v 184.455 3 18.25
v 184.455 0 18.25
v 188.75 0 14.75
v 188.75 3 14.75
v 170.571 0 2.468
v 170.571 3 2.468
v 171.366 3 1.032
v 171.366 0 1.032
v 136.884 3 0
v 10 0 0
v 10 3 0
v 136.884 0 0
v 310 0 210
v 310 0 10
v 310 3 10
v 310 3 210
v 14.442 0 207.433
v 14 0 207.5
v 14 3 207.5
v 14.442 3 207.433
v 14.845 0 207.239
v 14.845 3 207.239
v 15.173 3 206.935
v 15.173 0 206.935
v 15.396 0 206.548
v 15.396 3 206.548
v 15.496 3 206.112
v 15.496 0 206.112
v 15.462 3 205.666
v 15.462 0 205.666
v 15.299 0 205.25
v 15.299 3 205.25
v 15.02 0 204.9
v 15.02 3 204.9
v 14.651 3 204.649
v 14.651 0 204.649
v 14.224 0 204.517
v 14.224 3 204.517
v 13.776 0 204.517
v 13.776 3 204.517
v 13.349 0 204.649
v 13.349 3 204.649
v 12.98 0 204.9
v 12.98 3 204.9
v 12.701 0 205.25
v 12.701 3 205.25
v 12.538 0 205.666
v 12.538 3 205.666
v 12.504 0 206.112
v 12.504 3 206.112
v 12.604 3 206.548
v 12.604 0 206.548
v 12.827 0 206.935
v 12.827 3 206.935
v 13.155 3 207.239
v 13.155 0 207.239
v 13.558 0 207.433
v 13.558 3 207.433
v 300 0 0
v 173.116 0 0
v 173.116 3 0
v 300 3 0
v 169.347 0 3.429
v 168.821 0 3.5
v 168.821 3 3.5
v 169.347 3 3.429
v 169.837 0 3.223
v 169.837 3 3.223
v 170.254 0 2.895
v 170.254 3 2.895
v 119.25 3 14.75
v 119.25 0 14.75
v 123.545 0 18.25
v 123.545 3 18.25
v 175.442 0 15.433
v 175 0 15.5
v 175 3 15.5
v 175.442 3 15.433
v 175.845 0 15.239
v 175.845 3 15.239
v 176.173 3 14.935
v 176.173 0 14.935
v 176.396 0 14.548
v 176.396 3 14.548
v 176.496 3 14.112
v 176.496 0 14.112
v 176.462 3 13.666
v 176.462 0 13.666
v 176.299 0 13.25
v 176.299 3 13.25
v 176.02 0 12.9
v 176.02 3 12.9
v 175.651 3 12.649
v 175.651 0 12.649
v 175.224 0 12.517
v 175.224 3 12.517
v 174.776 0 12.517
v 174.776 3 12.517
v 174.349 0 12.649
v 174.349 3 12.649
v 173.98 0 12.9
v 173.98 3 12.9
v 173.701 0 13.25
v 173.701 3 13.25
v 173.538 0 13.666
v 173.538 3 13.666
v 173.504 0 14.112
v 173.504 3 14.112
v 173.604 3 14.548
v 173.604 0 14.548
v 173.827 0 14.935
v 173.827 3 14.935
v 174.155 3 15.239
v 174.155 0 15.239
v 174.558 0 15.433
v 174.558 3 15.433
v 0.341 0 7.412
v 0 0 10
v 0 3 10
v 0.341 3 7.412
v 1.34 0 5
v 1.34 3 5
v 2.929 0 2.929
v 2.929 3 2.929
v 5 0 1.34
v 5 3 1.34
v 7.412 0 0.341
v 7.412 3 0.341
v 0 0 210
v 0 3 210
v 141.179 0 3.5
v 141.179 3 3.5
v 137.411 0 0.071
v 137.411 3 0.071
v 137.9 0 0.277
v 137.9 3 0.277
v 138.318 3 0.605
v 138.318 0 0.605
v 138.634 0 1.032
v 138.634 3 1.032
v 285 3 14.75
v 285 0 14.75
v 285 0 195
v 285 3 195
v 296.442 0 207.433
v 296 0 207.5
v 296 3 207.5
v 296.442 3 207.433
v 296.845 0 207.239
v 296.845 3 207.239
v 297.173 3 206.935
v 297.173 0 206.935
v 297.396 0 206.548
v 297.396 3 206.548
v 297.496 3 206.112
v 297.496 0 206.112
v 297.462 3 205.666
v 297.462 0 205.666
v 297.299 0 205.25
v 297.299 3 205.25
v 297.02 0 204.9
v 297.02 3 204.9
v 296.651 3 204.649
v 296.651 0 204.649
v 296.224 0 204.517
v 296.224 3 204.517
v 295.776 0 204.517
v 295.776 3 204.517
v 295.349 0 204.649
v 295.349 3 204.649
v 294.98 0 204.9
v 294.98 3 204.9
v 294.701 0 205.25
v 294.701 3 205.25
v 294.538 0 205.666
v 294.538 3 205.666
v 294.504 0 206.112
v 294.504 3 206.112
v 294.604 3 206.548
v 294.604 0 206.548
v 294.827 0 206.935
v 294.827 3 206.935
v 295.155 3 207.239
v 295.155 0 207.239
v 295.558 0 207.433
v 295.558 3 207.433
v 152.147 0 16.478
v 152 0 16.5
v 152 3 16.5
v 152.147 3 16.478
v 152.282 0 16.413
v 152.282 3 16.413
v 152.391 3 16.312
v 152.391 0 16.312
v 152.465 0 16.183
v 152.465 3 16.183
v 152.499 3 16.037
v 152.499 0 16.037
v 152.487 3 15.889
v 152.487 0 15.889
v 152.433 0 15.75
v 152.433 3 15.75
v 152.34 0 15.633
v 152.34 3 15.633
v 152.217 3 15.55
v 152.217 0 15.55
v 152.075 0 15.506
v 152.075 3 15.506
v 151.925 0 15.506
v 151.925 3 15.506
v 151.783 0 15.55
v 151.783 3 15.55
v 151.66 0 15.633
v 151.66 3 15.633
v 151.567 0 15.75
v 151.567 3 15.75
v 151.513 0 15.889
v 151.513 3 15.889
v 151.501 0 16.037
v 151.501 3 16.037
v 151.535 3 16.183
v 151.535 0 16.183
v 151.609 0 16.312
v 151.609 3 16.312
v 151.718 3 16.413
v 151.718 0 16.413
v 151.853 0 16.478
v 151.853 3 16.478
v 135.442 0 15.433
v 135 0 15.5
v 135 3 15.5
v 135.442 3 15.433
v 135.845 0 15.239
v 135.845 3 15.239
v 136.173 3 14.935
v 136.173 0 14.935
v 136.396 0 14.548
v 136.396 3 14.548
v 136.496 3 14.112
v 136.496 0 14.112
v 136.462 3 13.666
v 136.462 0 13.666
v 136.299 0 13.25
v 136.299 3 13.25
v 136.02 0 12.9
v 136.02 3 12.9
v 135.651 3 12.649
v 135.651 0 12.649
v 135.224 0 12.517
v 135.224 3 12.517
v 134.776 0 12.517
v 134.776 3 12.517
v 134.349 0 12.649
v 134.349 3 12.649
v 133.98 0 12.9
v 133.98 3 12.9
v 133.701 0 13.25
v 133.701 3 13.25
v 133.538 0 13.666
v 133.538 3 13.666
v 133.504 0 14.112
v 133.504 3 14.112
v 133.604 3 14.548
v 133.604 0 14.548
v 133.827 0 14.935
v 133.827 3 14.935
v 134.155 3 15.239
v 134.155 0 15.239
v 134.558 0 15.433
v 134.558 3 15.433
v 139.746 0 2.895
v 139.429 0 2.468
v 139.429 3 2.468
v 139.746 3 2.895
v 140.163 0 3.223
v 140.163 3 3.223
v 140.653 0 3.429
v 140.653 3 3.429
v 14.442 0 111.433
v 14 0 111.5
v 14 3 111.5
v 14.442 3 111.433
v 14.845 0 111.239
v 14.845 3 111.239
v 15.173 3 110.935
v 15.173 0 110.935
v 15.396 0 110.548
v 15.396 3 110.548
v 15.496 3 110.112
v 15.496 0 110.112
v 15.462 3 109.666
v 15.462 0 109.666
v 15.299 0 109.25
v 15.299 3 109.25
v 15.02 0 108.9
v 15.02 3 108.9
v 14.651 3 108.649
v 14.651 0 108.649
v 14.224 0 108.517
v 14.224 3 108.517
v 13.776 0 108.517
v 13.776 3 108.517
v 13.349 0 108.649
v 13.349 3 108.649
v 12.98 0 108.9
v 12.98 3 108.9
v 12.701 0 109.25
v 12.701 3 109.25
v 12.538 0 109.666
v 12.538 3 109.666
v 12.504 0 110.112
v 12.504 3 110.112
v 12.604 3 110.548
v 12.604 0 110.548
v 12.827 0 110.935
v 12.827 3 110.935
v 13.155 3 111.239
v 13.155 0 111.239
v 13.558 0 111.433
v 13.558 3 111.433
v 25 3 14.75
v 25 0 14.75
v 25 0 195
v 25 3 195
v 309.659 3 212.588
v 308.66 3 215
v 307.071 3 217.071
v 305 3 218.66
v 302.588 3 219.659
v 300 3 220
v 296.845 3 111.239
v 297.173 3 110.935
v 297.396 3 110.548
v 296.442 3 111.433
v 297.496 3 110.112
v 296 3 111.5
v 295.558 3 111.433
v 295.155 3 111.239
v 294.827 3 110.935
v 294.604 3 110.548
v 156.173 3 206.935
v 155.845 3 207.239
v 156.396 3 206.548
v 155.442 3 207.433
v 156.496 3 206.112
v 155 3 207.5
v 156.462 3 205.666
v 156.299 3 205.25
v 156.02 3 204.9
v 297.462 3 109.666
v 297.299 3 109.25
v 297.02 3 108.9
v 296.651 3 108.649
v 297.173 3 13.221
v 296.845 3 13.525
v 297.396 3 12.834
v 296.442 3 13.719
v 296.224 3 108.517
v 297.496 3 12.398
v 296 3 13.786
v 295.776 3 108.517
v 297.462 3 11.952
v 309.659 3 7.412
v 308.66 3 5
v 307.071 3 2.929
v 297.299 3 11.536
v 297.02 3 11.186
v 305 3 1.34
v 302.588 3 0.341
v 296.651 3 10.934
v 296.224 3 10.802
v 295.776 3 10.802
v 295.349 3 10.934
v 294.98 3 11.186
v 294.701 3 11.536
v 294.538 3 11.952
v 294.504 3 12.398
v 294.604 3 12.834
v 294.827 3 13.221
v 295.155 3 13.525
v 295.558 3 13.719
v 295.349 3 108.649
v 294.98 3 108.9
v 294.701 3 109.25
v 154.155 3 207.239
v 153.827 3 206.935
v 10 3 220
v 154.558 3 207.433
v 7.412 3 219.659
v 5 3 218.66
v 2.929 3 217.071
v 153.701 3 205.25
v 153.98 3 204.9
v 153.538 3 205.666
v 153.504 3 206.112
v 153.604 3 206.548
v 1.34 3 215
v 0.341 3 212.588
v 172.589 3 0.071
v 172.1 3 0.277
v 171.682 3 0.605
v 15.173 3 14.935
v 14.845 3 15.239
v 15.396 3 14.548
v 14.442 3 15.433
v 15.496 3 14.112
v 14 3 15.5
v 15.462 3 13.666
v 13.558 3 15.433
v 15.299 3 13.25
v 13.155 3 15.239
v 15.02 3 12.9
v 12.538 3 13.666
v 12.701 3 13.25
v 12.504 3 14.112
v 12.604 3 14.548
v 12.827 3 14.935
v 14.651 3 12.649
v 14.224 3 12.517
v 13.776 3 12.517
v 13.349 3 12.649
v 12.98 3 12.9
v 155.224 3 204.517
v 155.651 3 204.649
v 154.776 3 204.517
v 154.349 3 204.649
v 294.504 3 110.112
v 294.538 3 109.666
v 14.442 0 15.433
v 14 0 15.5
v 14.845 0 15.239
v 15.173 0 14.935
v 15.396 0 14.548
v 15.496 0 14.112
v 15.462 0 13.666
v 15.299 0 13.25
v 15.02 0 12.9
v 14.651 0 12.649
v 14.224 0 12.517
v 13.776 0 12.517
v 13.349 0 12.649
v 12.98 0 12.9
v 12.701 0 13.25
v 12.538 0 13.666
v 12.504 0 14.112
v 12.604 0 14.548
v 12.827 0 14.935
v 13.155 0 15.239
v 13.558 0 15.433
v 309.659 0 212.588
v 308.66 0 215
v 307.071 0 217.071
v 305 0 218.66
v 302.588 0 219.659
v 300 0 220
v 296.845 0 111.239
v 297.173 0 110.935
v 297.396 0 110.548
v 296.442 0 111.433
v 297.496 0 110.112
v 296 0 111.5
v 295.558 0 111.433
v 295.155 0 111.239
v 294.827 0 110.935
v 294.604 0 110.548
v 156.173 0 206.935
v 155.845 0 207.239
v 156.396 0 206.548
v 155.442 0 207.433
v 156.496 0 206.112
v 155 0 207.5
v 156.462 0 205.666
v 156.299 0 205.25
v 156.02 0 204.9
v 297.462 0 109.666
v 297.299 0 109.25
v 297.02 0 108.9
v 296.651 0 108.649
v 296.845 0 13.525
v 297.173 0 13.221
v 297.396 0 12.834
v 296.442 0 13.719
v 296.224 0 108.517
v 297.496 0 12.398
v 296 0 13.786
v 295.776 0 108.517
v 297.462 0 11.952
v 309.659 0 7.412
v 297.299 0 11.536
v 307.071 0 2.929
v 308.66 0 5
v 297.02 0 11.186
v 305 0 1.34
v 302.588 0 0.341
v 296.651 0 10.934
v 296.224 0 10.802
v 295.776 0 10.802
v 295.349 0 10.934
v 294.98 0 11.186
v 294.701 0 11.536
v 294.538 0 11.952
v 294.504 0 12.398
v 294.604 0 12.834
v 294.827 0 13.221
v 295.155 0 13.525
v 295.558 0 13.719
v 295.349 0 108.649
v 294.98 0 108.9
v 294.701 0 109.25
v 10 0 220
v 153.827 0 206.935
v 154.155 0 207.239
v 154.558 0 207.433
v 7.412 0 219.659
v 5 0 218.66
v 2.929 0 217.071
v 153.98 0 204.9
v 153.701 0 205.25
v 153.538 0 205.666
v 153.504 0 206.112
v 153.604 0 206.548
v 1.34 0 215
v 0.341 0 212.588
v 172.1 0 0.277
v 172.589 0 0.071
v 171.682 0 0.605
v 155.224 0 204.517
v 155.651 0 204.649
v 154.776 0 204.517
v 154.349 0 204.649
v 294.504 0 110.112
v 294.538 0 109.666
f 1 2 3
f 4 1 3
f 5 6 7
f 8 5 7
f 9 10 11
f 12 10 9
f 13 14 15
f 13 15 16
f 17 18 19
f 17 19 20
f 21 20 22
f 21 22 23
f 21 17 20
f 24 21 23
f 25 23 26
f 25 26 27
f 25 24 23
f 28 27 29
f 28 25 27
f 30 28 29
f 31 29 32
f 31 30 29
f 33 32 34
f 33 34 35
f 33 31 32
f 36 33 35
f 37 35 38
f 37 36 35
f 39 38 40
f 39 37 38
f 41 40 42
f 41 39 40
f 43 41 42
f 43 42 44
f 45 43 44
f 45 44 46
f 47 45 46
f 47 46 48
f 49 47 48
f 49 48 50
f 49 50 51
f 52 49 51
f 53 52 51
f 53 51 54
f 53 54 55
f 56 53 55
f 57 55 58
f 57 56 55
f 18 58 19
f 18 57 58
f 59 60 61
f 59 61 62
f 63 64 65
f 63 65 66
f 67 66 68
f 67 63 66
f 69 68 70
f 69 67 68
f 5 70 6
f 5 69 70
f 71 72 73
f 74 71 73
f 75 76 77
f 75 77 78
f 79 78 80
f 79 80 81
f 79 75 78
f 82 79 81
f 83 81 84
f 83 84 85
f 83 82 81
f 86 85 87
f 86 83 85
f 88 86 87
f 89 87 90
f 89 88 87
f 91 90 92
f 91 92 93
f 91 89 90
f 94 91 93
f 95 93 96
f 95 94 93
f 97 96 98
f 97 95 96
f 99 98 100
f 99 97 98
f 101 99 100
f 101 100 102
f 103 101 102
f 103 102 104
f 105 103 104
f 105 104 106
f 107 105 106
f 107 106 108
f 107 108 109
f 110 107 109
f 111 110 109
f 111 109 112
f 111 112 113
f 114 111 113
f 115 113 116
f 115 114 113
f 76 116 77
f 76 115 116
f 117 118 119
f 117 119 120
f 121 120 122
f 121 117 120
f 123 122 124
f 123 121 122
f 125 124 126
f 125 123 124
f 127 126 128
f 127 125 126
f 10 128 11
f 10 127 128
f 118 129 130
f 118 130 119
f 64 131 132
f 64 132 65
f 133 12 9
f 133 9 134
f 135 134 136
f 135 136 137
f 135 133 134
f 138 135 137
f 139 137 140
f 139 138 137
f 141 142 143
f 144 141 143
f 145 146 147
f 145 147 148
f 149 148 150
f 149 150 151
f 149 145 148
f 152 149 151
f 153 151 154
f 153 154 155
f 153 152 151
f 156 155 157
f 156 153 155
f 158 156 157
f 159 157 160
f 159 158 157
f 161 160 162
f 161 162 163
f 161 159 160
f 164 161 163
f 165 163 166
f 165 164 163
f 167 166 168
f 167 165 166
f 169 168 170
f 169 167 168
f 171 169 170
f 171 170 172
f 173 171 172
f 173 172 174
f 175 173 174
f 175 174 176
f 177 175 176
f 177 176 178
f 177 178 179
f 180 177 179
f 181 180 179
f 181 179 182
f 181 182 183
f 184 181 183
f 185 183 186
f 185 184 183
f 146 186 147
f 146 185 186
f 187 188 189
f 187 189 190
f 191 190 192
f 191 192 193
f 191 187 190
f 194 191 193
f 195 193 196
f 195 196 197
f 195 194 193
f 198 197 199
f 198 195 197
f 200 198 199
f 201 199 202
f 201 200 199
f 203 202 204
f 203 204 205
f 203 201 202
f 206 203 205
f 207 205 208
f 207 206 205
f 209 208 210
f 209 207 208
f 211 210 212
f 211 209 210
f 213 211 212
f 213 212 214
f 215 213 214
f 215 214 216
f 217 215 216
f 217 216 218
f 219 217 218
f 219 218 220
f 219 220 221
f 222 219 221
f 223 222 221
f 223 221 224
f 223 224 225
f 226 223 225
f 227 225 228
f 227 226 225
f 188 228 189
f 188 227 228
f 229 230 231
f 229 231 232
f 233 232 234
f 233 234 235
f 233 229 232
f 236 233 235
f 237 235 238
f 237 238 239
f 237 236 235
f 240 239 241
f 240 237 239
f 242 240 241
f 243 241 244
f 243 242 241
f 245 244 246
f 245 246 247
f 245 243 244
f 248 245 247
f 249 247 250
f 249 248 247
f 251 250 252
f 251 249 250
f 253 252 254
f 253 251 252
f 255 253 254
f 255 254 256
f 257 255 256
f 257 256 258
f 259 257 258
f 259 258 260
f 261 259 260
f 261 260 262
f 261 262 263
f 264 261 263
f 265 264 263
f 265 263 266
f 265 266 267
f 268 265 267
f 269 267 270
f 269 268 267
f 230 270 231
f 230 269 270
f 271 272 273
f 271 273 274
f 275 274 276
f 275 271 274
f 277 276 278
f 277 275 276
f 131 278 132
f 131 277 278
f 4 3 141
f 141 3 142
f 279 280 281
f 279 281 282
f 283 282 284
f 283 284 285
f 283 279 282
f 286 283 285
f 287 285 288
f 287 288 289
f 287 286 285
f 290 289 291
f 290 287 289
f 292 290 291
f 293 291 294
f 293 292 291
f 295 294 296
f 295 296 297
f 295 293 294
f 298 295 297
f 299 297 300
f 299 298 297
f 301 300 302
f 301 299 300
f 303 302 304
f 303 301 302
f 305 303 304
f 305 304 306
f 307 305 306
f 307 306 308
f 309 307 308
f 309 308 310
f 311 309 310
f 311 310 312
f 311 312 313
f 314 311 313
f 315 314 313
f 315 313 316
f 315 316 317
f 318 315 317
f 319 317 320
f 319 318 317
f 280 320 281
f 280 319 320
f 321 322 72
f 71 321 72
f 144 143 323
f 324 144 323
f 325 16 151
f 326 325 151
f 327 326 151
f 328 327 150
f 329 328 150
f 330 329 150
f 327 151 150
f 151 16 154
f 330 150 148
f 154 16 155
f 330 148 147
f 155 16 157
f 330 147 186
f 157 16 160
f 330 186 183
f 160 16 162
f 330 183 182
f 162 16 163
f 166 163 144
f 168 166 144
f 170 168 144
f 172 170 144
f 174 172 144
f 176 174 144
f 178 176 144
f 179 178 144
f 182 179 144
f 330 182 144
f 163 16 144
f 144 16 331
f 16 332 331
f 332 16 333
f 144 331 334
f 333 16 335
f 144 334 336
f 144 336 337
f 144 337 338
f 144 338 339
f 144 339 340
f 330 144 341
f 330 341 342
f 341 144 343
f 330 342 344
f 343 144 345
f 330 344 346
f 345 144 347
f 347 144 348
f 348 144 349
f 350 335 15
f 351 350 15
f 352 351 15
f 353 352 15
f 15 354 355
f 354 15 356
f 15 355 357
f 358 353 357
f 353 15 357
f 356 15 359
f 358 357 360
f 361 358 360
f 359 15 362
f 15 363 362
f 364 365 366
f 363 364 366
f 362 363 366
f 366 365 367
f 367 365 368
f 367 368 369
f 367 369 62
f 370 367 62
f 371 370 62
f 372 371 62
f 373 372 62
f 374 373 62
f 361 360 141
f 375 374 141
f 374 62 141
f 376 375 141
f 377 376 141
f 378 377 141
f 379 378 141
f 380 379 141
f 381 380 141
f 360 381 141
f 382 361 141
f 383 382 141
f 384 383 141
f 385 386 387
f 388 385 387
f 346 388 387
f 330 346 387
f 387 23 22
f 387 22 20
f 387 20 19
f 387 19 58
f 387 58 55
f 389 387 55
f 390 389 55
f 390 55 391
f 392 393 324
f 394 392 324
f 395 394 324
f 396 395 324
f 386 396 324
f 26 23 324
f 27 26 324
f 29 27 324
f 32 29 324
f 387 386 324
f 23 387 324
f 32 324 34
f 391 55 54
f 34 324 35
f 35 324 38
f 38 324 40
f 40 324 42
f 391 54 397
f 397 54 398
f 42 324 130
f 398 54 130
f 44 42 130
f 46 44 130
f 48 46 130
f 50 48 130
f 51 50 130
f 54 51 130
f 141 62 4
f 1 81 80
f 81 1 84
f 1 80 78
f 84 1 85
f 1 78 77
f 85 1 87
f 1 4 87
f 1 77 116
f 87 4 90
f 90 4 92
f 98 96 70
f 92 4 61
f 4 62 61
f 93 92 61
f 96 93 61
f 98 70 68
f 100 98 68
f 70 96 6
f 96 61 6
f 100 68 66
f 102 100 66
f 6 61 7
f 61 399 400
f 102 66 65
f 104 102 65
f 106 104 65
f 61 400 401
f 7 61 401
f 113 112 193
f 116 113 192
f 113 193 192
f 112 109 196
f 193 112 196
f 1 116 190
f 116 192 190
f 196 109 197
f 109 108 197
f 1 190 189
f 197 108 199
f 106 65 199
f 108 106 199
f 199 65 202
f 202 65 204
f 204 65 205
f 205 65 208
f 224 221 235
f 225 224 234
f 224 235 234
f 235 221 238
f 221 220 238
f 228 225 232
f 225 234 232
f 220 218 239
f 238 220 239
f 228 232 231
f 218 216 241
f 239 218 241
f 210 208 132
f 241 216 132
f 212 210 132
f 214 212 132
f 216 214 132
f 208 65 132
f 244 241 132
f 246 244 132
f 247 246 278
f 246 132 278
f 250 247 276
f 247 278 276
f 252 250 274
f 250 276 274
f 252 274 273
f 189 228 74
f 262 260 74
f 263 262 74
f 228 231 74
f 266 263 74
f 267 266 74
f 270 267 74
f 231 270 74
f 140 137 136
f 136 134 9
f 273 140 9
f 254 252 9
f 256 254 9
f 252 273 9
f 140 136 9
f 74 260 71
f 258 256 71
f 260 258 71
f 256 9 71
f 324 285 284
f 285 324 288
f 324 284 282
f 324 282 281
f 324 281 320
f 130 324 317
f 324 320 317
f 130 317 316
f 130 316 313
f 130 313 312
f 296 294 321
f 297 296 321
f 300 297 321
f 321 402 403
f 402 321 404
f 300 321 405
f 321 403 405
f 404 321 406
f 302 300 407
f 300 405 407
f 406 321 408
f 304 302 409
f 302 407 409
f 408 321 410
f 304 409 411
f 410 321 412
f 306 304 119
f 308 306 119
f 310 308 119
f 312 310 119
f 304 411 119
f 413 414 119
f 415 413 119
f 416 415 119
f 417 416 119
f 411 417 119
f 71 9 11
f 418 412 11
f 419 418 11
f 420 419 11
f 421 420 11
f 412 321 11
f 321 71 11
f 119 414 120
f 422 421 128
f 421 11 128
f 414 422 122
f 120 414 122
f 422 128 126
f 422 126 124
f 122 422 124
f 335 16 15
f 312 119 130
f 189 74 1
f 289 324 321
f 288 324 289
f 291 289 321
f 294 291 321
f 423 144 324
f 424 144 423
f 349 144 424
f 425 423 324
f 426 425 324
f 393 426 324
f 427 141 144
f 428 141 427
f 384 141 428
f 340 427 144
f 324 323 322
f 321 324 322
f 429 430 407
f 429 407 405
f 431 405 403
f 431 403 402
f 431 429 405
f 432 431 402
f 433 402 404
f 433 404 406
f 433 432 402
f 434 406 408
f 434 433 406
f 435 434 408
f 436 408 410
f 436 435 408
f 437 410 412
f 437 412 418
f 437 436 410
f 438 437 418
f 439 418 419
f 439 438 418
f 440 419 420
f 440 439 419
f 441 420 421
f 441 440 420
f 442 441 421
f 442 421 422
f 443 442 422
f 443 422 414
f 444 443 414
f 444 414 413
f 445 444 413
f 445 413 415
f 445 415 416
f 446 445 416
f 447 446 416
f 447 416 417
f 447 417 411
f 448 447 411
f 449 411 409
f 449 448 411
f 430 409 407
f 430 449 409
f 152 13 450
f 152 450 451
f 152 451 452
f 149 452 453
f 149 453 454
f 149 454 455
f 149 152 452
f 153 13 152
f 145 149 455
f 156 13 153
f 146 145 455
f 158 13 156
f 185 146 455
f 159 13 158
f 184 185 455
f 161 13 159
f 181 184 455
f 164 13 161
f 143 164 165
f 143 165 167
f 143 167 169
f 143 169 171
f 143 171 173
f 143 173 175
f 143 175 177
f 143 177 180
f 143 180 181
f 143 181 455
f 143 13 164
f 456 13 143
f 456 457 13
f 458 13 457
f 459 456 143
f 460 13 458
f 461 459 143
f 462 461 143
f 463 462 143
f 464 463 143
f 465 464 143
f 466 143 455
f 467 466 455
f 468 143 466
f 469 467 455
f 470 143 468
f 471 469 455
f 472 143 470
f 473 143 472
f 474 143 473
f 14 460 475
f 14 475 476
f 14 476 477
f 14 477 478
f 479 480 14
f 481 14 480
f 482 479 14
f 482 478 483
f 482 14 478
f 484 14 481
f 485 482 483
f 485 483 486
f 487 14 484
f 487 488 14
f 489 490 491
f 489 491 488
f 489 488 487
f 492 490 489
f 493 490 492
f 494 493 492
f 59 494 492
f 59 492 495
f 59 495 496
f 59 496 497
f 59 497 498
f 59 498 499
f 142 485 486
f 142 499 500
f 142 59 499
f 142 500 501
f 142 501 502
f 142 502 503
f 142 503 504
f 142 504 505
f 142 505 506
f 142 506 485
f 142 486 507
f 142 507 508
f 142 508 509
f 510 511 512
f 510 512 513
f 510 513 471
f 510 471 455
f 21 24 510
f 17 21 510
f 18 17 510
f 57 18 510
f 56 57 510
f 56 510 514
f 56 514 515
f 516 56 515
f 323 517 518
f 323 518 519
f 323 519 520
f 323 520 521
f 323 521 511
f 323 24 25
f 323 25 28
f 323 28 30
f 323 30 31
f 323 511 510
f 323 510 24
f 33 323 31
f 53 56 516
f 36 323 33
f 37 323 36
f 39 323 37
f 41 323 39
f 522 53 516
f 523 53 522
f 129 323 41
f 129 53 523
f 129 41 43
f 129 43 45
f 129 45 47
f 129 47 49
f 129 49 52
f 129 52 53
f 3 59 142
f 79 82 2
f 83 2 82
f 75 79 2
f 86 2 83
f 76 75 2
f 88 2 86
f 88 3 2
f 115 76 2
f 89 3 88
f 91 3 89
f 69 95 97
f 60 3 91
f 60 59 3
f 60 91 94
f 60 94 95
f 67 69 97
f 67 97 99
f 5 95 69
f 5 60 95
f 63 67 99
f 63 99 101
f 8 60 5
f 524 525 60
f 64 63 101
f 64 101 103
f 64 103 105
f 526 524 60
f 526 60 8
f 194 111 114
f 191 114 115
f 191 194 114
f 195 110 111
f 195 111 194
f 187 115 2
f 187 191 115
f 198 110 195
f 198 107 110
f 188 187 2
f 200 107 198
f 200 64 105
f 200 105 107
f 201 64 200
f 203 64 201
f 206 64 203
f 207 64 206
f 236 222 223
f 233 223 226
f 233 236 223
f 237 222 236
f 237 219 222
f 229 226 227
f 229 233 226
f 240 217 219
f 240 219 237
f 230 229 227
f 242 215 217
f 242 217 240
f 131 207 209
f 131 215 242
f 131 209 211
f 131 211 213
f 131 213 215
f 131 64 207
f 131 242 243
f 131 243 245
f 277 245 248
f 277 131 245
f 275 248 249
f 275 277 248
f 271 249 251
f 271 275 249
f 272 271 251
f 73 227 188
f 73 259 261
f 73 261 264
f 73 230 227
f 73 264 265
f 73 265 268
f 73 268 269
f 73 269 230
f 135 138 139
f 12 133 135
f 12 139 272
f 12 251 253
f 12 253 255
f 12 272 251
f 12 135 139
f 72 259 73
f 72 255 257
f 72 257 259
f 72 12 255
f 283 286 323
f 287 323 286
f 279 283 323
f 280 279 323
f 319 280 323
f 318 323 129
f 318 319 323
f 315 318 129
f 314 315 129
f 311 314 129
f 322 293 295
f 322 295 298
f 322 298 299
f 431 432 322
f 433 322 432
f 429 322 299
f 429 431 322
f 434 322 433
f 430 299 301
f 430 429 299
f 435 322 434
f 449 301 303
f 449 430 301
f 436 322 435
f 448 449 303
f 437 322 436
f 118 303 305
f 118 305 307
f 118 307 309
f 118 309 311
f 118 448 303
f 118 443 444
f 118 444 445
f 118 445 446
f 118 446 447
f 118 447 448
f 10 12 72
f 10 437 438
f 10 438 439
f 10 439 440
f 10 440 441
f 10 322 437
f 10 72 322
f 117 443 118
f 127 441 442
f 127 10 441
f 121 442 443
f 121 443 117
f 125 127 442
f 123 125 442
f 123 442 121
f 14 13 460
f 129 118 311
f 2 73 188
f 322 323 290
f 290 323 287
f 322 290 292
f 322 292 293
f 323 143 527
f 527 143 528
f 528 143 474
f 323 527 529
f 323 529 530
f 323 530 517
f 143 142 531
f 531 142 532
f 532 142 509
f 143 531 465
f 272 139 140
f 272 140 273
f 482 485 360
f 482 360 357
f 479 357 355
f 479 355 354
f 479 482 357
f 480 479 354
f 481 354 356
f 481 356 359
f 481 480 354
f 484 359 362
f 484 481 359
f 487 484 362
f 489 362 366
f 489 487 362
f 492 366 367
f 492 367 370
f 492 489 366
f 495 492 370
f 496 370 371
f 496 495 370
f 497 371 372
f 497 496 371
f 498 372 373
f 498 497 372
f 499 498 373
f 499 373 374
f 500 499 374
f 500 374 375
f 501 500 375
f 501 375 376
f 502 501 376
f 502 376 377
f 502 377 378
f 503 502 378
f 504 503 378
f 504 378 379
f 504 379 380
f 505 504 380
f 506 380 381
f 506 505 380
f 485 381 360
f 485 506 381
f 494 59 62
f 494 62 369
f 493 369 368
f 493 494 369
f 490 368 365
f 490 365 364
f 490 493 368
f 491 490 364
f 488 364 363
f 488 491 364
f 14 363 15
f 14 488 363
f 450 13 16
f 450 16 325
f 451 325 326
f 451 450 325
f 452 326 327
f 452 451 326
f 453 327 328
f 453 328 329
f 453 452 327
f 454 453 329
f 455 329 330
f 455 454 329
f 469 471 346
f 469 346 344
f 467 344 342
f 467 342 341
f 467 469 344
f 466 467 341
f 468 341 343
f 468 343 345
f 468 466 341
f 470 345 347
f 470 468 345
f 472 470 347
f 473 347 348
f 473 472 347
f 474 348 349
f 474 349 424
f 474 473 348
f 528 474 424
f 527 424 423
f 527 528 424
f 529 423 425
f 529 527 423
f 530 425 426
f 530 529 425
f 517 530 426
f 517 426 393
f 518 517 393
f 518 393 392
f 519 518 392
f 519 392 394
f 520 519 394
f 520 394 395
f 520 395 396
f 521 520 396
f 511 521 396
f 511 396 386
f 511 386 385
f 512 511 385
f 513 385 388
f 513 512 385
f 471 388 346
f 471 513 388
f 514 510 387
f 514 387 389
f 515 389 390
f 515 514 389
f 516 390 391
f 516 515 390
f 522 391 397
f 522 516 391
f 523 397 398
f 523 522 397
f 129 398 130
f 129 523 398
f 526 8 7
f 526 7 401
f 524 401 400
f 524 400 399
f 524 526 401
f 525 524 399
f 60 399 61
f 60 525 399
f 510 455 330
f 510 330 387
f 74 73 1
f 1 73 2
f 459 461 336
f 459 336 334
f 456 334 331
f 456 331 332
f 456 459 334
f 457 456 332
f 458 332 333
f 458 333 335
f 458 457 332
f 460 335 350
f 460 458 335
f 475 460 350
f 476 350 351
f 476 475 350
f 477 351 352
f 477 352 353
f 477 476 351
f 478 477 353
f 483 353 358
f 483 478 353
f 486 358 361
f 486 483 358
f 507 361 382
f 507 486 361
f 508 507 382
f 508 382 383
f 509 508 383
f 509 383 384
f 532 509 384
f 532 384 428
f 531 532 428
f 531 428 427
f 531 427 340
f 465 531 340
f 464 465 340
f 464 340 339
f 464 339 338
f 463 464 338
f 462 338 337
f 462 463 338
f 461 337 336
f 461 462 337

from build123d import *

# Parameters (mm, degrees)
SKETCH_1_R      = 1.5
SKETCH_1_R_2    = 0.5
EXTRUDE_1_DEPTH = 3


with BuildPart() as part:
    # 草图1 → 凸台-拉伸1 (new body)
    with BuildSketch(Plane(origin=(0, 0, 0), x_dir=(1, 0, 0), z_dir=(0, 1, 0))):
        with BuildLine():
            Line((10, 0), (136.884360712, 0))
            ThreePointArc((136.884360712, 0), (137.900113715, -0.277140216), (138.634360712, -1.031754163))
            Line((138.634360712, -1.031754163), (139.429147615, -2.468245837))
            ThreePointArc((139.429147615, -2.468245837), (140.163394612, -3.222859784), (141.179147615, -3.5))
            Line((141.179147615, -3.5), (168.820852385, -3.5))
            ThreePointArc((168.820852385, -3.5), (169.836605388, -3.222859784), (170.570852385, -2.468245837))
            Line((170.570852385, -2.468245837), (171.365639288, -1.031754163))
            ThreePointArc((171.365639288, -1.031754163), (172.099886285, -0.277140216), (173.115639288, 0))
            Line((173.115639288, 0), (300, 0))
            ThreePointArc((300, 0), (307.071067812, -2.928932188), (310, -10))
            Line((310, -10), (310, -210))
            ThreePointArc((310, -210), (307.071067812, -217.071067812), (300, -220))
            Line((300, -220), (10, -220))
            ThreePointArc((10, -220), (2.928932188, -217.071067812), (0, -210))
            Line((0, -210), (0, -10))
            ThreePointArc((0, -10), (2.928932188, -2.928932188), (10, 0))
        make_face()
        with Locations(Location((14, -14, 0), (0, 0, 270))):
            Circle(SKETCH_1_R, mode=Mode.SUBTRACT)
        with Locations(Location((14, -206, 0), (0, 0, 270))):
            Circle(SKETCH_1_R, mode=Mode.SUBTRACT)
        with Locations(Location((296, -206, 0), (0, 0, 270))):
            Circle(SKETCH_1_R, mode=Mode.SUBTRACT)
        with Locations(Location((296, -12.28568254, 0), (0, 0, 270))):
            Circle(SKETCH_1_R, mode=Mode.SUBTRACT)
        with Locations(Location((155, -206, 0), (0, 0, 270))):
            Circle(SKETCH_1_R, mode=Mode.SUBTRACT)
        with Locations(Location((175, -14, 0), (0, 0, 270))):
            Circle(SKETCH_1_R, mode=Mode.SUBTRACT)
        with Locations(Location((135, -14, 0), (0, 0, 270))):
            Circle(SKETCH_1_R, mode=Mode.SUBTRACT)
        with Locations(Location((296, -110, 0), (0, 0, 270))):
            Circle(SKETCH_1_R, mode=Mode.SUBTRACT)
        with Locations(Location((14, -110, 0), (0, 0, 270))):
            Circle(SKETCH_1_R, mode=Mode.SUBTRACT)
        with Locations(Location((152, -16, 0), (0, 0, 270))):
            Circle(SKETCH_1_R_2, mode=Mode.SUBTRACT)
        Polygon((184.455213096, -18.25), (188.75, -14.75), (285, -14.75), (285, -195), (25, -195), (25, -14.75), (119.25, -14.75), (123.544786904, -18.25), (141.179147615, -18.25), (168.820852385, -18.25), align=None, mode=Mode.SUBTRACT)
    extrude(amount=EXTRUDE_1_DEPTH)


solid = part.part
